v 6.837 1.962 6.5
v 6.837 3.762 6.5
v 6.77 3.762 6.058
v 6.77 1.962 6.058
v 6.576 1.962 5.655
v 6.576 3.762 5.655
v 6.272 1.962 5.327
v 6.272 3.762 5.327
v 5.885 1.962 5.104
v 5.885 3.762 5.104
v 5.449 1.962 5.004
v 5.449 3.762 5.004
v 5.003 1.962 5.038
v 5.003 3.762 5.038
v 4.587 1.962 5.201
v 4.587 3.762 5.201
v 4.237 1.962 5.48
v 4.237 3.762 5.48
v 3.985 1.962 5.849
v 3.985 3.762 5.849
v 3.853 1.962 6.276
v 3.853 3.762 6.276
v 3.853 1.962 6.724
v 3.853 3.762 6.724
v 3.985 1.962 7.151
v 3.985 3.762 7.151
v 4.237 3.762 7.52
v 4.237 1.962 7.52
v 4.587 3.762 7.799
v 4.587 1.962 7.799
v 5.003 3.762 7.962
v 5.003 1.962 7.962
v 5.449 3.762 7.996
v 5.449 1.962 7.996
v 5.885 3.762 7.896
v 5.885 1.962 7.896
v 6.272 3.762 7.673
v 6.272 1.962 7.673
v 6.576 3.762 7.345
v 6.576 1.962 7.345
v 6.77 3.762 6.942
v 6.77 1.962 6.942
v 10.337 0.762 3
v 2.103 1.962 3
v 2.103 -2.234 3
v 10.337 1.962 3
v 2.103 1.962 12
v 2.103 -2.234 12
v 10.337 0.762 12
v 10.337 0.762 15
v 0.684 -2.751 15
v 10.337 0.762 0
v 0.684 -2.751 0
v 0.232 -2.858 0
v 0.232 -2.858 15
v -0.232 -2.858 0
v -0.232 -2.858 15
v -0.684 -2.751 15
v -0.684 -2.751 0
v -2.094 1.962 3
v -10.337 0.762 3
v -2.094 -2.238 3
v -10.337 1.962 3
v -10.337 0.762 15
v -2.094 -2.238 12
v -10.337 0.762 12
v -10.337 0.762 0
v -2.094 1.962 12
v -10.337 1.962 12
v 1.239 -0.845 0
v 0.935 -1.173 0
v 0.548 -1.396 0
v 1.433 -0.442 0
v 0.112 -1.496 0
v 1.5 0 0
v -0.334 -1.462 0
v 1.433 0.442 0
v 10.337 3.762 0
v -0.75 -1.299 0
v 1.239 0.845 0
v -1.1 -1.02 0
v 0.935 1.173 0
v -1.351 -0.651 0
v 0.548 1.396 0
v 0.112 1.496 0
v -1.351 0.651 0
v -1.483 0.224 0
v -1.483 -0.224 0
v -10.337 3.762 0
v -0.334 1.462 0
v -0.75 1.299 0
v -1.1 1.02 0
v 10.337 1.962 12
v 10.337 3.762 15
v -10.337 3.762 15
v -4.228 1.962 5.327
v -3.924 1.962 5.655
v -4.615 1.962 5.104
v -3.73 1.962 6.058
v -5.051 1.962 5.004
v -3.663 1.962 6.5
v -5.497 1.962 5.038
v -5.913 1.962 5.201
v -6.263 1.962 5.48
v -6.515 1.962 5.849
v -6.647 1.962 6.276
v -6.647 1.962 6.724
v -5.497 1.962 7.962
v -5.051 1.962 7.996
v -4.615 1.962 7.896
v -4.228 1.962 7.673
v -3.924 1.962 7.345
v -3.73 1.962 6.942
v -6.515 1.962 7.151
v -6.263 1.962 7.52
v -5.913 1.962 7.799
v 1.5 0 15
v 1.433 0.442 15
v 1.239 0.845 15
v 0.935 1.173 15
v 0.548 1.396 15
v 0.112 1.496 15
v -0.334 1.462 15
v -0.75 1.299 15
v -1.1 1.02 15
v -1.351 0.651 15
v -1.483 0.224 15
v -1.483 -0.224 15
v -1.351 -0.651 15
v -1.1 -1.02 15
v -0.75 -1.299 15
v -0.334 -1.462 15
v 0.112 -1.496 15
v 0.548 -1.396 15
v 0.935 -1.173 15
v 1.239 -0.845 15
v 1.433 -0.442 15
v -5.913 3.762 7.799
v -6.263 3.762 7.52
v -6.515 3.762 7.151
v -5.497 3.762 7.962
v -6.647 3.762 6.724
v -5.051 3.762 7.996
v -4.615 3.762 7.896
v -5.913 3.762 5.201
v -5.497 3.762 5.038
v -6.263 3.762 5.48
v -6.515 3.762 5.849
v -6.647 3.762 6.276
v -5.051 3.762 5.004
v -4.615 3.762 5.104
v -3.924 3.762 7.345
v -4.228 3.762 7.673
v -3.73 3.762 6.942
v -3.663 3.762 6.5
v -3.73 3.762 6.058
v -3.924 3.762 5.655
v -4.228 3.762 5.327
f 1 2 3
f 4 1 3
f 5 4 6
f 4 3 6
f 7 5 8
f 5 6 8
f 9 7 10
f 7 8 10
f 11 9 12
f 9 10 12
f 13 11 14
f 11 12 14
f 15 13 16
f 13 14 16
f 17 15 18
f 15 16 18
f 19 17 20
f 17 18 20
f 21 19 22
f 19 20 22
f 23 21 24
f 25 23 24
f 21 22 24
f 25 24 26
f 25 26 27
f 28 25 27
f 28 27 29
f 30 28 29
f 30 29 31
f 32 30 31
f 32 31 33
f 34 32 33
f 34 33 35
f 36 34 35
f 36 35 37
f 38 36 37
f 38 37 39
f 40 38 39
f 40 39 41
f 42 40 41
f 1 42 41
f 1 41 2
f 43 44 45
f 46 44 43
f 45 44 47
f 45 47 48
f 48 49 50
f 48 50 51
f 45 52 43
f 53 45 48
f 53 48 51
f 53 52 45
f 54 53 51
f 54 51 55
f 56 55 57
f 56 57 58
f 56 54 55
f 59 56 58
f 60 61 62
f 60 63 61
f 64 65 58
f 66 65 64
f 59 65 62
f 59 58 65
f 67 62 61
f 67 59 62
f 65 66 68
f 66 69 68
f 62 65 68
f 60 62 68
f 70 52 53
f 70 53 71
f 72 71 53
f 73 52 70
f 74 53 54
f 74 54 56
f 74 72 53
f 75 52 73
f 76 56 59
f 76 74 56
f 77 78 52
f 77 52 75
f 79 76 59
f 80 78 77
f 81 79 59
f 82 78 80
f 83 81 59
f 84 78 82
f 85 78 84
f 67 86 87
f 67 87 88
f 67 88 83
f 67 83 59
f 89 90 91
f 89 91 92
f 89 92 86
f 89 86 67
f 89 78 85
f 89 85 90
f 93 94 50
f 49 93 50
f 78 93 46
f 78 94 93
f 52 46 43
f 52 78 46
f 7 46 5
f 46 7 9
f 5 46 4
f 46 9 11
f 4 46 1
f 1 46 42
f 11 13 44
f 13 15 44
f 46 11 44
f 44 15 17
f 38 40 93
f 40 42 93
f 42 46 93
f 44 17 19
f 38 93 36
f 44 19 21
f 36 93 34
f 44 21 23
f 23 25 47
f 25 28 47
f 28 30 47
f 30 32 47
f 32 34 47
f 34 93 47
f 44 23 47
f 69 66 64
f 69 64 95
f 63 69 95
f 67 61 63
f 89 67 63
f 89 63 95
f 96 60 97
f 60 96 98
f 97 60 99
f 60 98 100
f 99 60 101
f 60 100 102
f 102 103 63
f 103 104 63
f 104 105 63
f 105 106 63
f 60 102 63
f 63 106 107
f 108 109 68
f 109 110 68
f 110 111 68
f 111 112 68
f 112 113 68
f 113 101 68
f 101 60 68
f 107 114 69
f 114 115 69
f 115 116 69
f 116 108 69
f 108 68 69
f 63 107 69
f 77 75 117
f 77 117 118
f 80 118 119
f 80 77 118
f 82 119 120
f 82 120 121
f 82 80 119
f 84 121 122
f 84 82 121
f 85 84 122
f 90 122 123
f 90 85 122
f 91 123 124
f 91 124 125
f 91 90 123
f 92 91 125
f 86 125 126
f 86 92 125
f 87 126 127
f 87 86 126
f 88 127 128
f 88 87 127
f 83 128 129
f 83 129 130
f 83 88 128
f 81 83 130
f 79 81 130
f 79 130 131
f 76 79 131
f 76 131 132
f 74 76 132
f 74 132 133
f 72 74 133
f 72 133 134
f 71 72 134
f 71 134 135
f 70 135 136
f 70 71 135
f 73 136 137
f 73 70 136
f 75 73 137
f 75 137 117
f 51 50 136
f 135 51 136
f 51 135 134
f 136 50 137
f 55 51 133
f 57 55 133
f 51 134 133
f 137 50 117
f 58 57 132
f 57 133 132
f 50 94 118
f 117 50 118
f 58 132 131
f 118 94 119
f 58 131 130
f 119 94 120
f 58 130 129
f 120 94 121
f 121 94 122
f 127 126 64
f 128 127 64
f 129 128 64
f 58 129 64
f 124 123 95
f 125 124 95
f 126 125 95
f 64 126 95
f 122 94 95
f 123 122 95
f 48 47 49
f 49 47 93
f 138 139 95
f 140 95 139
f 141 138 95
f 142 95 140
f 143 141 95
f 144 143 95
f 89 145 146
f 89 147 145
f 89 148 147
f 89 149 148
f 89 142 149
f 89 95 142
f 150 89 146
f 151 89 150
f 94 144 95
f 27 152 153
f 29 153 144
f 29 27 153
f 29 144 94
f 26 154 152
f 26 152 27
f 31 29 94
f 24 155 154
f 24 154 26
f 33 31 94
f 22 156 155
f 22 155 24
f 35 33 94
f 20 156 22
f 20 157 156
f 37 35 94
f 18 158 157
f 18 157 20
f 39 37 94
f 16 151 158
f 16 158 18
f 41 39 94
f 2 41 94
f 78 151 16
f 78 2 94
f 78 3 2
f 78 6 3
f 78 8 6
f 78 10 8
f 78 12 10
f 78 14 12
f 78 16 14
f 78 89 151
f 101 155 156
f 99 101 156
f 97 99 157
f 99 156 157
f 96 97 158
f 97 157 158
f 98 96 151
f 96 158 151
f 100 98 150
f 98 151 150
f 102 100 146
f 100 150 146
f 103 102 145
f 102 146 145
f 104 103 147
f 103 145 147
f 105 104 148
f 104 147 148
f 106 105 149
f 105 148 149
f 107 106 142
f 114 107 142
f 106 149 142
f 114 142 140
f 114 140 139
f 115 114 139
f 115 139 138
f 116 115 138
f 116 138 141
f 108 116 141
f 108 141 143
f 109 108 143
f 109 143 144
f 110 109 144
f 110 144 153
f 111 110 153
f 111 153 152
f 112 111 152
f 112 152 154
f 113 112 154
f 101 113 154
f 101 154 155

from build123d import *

# Parameters (mm, degrees)
CROQUIS2_R              = 1.5
SALIENTE_EXTRUIR2_DEPTH = 15
CROQUIS3_R              = 1.5
CORTAR_EXTRUIR1_DEPTH   = 7.633866032
CORTAR_EXTRUIR2_DEPTH   = 9
CORTAR_EXTRUIR3_DEPTH   = 9


with BuildPart() as part:
    # Croquis2 → Saliente-Extruir2 (new body)
    with BuildSketch(Plane.XY):
        with BuildLine():
            Line((-0.684040287, -2.751029697), (-10.336618829, 0.762221577))
            Line((-10.336618829, 0.762221577), (-10.336618829, 3.762221577))
            Line((-10.336618829, 3.762221577), (10.336618829, 3.762221577))
            Line((10.336618829, 3.762221577), (10.336618829, 0.762221577))
            Line((10.336618829, 0.762221577), (0.684040287, -2.751029697))
            ThreePointArc((0.684040287, -2.751029697), (0, -2.871644455), (-0.684040287, -2.751029697))
        make_face()
        Circle(CROQUIS2_R, mode=Mode.SUBTRACT)
    extrude(amount=SALIENTE_EXTRUIR2_DEPTH)

    # Croquis3 → Cortar-Extruir1 (cut, through all)
    with BuildSketch(Plane(origin=(0, 3.762221577, 0), x_dir=(1, 0, 0), z_dir=(0, 1, 0))):
        with Locations((5.336618829, -6.5)):
            Circle(CROQUIS3_R)
        with Locations((-5.163381171, -6.5)):
            Circle(CROQUIS3_R)
    extrude(amount=-CORTAR_EXTRUIR1_DEPTH, mode=Mode.SUBTRACT)

    # Croquis4 → Cortar-Extruir2 (cut)
    with BuildSketch(Plane.XY.offset(12)):
        Polygon((10.336618829, 0.762221577), (10.336618829, 1.962221577), (2.103415276, 1.962221577), (2.103415276, -2.234419449), align=None)
    extrude(amount=-CORTAR_EXTRUIR2_DEPTH, mode=Mode.SUBTRACT)

    # Croquis5 → Cortar-Extruir3 (cut)
    with BuildSketch(Plane.XY.offset(12)):
        Polygon((-10.336618829, 0.762221577), (-2.09418657, -2.237778423), (-2.09418657, 1.962221577), (-10.336618829, 1.962221577), align=None)
    extrude(amount=-CORTAR_EXTRUIR3_DEPTH, mode=Mode.SUBTRACT)


solid = part.part
